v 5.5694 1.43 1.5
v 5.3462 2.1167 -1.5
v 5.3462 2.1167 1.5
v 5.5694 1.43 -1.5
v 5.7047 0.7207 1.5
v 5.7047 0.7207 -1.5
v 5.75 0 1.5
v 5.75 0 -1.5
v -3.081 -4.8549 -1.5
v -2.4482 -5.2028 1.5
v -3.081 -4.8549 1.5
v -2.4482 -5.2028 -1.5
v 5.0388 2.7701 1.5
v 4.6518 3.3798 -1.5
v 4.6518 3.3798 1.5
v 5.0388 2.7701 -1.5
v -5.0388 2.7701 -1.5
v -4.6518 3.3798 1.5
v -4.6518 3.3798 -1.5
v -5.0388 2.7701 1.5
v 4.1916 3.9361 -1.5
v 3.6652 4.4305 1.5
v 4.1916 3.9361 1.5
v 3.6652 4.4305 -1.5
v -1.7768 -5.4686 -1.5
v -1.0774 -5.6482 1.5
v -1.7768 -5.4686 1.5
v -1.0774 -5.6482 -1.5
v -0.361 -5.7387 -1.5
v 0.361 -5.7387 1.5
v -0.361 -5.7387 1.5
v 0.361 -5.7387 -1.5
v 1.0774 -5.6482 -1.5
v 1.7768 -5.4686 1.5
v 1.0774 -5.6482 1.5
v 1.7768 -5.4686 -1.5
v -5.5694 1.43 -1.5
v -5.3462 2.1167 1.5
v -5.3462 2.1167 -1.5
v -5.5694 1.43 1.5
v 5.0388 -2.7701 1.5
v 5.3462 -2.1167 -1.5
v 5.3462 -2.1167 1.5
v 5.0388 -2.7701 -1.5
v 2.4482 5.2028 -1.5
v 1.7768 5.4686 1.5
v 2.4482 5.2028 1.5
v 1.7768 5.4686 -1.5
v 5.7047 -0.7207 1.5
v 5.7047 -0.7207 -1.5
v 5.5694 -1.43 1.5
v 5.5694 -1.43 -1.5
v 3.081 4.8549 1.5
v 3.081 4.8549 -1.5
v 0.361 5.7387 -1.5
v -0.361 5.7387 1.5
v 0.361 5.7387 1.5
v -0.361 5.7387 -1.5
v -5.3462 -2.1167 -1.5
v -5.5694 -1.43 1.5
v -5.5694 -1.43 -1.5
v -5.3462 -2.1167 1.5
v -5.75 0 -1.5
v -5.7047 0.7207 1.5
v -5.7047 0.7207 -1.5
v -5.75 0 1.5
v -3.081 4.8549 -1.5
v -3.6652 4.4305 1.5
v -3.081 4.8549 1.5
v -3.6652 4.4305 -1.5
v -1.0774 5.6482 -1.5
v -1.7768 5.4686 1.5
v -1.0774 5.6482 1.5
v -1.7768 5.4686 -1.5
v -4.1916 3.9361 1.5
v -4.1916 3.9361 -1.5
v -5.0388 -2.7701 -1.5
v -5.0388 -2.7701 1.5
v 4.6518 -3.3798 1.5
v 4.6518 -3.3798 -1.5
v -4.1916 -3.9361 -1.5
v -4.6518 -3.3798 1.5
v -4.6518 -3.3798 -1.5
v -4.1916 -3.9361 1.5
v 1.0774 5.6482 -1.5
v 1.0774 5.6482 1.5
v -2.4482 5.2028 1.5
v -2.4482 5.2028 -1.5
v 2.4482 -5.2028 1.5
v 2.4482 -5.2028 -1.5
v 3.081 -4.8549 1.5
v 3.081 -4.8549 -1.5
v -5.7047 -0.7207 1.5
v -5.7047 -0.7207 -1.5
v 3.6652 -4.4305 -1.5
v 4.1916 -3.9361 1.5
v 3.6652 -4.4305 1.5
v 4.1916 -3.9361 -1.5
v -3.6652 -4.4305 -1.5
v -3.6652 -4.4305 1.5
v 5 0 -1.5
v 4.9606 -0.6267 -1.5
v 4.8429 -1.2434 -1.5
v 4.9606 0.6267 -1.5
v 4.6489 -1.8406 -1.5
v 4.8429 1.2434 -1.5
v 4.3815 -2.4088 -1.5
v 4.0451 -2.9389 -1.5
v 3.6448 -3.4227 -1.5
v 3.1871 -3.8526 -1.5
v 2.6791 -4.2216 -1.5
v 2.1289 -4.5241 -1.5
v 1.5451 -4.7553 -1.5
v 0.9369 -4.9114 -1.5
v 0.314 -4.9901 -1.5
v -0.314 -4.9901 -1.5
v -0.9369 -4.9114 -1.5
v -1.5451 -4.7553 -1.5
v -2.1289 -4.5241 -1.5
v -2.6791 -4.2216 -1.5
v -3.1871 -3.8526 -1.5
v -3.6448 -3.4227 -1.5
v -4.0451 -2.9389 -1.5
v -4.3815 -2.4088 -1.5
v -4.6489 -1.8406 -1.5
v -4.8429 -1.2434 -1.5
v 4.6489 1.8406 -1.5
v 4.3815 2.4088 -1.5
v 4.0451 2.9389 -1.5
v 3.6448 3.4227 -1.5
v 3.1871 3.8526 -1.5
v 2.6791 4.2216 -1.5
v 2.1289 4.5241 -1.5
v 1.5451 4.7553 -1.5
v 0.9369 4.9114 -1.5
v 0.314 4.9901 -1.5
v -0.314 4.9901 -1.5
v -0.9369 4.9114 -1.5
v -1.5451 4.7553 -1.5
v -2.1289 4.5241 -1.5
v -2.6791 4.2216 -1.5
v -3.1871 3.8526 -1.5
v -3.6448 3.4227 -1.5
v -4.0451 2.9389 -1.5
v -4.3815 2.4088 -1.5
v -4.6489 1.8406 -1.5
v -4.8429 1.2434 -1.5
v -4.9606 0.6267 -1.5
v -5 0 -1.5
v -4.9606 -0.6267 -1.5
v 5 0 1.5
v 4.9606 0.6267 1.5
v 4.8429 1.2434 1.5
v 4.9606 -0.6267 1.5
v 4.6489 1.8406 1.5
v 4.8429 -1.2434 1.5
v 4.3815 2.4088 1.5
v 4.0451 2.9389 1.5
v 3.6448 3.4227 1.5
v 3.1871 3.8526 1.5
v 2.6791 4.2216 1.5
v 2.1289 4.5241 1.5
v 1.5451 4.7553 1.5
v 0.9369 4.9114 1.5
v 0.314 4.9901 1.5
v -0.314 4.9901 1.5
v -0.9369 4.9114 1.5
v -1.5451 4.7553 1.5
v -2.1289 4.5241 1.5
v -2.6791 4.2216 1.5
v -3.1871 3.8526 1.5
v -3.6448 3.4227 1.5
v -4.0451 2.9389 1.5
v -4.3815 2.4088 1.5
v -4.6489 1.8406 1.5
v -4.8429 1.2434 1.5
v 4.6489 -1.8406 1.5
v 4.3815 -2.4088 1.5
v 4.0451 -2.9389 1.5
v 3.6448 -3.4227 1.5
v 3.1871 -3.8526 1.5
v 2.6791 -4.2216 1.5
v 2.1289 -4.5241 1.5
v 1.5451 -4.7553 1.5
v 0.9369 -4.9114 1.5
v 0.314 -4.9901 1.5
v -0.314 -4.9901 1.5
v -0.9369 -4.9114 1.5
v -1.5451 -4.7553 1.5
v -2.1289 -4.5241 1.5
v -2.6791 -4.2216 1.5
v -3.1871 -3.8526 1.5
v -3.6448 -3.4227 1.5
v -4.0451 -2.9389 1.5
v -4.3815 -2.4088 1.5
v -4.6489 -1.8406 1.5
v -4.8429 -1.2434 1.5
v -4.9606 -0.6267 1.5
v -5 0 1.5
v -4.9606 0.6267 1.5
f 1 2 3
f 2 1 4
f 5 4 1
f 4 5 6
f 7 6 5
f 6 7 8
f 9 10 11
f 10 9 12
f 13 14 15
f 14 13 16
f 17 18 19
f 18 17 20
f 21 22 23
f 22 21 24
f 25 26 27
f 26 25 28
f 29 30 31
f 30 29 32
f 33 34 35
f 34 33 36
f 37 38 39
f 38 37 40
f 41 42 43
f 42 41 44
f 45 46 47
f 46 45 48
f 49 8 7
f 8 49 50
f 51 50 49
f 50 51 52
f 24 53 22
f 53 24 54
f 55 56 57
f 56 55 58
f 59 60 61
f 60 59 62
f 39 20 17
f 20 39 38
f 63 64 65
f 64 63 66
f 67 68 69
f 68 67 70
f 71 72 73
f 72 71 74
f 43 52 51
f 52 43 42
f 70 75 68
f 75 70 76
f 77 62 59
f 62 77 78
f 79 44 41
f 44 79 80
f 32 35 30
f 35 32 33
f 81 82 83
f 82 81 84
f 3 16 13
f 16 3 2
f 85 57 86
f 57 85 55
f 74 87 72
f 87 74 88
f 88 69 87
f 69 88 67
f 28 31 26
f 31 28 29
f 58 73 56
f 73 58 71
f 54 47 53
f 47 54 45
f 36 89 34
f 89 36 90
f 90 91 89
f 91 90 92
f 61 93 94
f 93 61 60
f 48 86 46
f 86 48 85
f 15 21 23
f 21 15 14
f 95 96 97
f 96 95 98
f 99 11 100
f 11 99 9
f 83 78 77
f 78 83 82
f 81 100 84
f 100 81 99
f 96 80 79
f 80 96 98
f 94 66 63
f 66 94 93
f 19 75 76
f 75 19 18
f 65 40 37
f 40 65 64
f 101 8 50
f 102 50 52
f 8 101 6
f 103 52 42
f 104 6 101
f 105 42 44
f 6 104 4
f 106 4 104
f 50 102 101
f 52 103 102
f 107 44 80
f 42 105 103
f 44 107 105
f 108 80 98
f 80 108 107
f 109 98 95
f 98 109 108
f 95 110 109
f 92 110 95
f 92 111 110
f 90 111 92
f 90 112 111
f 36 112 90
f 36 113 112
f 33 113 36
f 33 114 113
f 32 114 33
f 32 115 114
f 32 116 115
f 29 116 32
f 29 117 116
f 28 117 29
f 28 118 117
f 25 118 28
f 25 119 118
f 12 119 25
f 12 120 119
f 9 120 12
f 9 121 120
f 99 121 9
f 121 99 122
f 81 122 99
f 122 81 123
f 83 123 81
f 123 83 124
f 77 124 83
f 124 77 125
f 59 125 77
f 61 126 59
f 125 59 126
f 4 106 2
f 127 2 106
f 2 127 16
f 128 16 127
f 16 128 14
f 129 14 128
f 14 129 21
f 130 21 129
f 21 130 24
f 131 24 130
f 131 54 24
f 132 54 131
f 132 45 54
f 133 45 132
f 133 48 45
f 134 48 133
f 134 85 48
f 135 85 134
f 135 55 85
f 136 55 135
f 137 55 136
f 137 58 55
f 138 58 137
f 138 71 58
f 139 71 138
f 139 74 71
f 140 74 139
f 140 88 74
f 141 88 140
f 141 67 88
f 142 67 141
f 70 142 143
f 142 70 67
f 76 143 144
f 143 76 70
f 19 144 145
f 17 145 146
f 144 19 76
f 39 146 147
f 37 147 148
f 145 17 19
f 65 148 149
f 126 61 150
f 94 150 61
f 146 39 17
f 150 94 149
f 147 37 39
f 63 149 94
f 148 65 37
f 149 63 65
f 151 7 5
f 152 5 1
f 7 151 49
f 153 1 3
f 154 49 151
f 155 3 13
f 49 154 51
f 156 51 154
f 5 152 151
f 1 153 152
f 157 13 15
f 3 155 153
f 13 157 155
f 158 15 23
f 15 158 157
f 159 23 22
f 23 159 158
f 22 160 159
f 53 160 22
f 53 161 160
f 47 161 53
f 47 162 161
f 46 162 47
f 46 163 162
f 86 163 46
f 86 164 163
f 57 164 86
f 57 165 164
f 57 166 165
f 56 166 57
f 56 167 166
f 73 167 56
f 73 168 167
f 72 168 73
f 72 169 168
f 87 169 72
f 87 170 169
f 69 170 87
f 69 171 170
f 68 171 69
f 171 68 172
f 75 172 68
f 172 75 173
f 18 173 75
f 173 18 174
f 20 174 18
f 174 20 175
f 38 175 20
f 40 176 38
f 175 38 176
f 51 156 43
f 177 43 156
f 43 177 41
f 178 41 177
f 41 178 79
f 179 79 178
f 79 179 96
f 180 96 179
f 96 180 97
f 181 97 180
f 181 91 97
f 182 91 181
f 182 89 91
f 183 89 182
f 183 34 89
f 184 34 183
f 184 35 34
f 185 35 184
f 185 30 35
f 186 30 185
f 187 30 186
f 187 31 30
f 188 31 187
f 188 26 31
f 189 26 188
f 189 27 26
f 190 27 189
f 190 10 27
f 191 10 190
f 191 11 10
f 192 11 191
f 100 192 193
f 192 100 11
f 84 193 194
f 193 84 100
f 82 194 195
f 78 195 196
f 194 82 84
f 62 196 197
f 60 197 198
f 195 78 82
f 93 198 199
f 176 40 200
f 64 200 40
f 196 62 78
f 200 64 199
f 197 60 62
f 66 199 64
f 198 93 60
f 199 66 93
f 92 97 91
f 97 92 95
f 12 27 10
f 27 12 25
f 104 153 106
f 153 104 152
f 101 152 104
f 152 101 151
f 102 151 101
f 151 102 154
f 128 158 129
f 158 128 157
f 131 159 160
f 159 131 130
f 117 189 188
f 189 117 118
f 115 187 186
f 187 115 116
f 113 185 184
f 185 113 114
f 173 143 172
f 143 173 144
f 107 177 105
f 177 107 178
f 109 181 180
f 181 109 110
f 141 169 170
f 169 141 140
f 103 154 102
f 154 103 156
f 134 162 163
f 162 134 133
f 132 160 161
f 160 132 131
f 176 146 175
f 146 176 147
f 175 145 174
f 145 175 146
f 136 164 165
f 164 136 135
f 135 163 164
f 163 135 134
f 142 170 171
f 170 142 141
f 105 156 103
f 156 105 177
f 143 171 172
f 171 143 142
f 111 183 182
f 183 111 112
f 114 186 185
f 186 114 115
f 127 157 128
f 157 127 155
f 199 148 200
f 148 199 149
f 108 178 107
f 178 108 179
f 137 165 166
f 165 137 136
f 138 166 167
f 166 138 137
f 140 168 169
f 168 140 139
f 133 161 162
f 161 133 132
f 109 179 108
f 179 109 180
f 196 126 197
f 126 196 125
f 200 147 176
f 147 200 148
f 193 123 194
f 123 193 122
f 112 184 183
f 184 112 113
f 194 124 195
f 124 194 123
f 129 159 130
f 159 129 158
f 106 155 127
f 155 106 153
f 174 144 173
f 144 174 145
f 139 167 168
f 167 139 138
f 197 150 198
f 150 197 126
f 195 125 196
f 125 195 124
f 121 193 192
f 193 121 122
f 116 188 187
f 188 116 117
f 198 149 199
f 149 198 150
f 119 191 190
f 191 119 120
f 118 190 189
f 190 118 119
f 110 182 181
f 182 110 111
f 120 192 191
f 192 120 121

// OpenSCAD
$fn = 50;


difference() {
	union() {
		translate(v = [0, 0, -1.5000000000]) {
			cylinder(h = 3, r = 5.7500000000);
		}
	}
	union() {
		translate(v = [0, 0, -100.0000000000]) {
			cylinder(h = 200, r = 5.0000000000);
		}
	}
}
